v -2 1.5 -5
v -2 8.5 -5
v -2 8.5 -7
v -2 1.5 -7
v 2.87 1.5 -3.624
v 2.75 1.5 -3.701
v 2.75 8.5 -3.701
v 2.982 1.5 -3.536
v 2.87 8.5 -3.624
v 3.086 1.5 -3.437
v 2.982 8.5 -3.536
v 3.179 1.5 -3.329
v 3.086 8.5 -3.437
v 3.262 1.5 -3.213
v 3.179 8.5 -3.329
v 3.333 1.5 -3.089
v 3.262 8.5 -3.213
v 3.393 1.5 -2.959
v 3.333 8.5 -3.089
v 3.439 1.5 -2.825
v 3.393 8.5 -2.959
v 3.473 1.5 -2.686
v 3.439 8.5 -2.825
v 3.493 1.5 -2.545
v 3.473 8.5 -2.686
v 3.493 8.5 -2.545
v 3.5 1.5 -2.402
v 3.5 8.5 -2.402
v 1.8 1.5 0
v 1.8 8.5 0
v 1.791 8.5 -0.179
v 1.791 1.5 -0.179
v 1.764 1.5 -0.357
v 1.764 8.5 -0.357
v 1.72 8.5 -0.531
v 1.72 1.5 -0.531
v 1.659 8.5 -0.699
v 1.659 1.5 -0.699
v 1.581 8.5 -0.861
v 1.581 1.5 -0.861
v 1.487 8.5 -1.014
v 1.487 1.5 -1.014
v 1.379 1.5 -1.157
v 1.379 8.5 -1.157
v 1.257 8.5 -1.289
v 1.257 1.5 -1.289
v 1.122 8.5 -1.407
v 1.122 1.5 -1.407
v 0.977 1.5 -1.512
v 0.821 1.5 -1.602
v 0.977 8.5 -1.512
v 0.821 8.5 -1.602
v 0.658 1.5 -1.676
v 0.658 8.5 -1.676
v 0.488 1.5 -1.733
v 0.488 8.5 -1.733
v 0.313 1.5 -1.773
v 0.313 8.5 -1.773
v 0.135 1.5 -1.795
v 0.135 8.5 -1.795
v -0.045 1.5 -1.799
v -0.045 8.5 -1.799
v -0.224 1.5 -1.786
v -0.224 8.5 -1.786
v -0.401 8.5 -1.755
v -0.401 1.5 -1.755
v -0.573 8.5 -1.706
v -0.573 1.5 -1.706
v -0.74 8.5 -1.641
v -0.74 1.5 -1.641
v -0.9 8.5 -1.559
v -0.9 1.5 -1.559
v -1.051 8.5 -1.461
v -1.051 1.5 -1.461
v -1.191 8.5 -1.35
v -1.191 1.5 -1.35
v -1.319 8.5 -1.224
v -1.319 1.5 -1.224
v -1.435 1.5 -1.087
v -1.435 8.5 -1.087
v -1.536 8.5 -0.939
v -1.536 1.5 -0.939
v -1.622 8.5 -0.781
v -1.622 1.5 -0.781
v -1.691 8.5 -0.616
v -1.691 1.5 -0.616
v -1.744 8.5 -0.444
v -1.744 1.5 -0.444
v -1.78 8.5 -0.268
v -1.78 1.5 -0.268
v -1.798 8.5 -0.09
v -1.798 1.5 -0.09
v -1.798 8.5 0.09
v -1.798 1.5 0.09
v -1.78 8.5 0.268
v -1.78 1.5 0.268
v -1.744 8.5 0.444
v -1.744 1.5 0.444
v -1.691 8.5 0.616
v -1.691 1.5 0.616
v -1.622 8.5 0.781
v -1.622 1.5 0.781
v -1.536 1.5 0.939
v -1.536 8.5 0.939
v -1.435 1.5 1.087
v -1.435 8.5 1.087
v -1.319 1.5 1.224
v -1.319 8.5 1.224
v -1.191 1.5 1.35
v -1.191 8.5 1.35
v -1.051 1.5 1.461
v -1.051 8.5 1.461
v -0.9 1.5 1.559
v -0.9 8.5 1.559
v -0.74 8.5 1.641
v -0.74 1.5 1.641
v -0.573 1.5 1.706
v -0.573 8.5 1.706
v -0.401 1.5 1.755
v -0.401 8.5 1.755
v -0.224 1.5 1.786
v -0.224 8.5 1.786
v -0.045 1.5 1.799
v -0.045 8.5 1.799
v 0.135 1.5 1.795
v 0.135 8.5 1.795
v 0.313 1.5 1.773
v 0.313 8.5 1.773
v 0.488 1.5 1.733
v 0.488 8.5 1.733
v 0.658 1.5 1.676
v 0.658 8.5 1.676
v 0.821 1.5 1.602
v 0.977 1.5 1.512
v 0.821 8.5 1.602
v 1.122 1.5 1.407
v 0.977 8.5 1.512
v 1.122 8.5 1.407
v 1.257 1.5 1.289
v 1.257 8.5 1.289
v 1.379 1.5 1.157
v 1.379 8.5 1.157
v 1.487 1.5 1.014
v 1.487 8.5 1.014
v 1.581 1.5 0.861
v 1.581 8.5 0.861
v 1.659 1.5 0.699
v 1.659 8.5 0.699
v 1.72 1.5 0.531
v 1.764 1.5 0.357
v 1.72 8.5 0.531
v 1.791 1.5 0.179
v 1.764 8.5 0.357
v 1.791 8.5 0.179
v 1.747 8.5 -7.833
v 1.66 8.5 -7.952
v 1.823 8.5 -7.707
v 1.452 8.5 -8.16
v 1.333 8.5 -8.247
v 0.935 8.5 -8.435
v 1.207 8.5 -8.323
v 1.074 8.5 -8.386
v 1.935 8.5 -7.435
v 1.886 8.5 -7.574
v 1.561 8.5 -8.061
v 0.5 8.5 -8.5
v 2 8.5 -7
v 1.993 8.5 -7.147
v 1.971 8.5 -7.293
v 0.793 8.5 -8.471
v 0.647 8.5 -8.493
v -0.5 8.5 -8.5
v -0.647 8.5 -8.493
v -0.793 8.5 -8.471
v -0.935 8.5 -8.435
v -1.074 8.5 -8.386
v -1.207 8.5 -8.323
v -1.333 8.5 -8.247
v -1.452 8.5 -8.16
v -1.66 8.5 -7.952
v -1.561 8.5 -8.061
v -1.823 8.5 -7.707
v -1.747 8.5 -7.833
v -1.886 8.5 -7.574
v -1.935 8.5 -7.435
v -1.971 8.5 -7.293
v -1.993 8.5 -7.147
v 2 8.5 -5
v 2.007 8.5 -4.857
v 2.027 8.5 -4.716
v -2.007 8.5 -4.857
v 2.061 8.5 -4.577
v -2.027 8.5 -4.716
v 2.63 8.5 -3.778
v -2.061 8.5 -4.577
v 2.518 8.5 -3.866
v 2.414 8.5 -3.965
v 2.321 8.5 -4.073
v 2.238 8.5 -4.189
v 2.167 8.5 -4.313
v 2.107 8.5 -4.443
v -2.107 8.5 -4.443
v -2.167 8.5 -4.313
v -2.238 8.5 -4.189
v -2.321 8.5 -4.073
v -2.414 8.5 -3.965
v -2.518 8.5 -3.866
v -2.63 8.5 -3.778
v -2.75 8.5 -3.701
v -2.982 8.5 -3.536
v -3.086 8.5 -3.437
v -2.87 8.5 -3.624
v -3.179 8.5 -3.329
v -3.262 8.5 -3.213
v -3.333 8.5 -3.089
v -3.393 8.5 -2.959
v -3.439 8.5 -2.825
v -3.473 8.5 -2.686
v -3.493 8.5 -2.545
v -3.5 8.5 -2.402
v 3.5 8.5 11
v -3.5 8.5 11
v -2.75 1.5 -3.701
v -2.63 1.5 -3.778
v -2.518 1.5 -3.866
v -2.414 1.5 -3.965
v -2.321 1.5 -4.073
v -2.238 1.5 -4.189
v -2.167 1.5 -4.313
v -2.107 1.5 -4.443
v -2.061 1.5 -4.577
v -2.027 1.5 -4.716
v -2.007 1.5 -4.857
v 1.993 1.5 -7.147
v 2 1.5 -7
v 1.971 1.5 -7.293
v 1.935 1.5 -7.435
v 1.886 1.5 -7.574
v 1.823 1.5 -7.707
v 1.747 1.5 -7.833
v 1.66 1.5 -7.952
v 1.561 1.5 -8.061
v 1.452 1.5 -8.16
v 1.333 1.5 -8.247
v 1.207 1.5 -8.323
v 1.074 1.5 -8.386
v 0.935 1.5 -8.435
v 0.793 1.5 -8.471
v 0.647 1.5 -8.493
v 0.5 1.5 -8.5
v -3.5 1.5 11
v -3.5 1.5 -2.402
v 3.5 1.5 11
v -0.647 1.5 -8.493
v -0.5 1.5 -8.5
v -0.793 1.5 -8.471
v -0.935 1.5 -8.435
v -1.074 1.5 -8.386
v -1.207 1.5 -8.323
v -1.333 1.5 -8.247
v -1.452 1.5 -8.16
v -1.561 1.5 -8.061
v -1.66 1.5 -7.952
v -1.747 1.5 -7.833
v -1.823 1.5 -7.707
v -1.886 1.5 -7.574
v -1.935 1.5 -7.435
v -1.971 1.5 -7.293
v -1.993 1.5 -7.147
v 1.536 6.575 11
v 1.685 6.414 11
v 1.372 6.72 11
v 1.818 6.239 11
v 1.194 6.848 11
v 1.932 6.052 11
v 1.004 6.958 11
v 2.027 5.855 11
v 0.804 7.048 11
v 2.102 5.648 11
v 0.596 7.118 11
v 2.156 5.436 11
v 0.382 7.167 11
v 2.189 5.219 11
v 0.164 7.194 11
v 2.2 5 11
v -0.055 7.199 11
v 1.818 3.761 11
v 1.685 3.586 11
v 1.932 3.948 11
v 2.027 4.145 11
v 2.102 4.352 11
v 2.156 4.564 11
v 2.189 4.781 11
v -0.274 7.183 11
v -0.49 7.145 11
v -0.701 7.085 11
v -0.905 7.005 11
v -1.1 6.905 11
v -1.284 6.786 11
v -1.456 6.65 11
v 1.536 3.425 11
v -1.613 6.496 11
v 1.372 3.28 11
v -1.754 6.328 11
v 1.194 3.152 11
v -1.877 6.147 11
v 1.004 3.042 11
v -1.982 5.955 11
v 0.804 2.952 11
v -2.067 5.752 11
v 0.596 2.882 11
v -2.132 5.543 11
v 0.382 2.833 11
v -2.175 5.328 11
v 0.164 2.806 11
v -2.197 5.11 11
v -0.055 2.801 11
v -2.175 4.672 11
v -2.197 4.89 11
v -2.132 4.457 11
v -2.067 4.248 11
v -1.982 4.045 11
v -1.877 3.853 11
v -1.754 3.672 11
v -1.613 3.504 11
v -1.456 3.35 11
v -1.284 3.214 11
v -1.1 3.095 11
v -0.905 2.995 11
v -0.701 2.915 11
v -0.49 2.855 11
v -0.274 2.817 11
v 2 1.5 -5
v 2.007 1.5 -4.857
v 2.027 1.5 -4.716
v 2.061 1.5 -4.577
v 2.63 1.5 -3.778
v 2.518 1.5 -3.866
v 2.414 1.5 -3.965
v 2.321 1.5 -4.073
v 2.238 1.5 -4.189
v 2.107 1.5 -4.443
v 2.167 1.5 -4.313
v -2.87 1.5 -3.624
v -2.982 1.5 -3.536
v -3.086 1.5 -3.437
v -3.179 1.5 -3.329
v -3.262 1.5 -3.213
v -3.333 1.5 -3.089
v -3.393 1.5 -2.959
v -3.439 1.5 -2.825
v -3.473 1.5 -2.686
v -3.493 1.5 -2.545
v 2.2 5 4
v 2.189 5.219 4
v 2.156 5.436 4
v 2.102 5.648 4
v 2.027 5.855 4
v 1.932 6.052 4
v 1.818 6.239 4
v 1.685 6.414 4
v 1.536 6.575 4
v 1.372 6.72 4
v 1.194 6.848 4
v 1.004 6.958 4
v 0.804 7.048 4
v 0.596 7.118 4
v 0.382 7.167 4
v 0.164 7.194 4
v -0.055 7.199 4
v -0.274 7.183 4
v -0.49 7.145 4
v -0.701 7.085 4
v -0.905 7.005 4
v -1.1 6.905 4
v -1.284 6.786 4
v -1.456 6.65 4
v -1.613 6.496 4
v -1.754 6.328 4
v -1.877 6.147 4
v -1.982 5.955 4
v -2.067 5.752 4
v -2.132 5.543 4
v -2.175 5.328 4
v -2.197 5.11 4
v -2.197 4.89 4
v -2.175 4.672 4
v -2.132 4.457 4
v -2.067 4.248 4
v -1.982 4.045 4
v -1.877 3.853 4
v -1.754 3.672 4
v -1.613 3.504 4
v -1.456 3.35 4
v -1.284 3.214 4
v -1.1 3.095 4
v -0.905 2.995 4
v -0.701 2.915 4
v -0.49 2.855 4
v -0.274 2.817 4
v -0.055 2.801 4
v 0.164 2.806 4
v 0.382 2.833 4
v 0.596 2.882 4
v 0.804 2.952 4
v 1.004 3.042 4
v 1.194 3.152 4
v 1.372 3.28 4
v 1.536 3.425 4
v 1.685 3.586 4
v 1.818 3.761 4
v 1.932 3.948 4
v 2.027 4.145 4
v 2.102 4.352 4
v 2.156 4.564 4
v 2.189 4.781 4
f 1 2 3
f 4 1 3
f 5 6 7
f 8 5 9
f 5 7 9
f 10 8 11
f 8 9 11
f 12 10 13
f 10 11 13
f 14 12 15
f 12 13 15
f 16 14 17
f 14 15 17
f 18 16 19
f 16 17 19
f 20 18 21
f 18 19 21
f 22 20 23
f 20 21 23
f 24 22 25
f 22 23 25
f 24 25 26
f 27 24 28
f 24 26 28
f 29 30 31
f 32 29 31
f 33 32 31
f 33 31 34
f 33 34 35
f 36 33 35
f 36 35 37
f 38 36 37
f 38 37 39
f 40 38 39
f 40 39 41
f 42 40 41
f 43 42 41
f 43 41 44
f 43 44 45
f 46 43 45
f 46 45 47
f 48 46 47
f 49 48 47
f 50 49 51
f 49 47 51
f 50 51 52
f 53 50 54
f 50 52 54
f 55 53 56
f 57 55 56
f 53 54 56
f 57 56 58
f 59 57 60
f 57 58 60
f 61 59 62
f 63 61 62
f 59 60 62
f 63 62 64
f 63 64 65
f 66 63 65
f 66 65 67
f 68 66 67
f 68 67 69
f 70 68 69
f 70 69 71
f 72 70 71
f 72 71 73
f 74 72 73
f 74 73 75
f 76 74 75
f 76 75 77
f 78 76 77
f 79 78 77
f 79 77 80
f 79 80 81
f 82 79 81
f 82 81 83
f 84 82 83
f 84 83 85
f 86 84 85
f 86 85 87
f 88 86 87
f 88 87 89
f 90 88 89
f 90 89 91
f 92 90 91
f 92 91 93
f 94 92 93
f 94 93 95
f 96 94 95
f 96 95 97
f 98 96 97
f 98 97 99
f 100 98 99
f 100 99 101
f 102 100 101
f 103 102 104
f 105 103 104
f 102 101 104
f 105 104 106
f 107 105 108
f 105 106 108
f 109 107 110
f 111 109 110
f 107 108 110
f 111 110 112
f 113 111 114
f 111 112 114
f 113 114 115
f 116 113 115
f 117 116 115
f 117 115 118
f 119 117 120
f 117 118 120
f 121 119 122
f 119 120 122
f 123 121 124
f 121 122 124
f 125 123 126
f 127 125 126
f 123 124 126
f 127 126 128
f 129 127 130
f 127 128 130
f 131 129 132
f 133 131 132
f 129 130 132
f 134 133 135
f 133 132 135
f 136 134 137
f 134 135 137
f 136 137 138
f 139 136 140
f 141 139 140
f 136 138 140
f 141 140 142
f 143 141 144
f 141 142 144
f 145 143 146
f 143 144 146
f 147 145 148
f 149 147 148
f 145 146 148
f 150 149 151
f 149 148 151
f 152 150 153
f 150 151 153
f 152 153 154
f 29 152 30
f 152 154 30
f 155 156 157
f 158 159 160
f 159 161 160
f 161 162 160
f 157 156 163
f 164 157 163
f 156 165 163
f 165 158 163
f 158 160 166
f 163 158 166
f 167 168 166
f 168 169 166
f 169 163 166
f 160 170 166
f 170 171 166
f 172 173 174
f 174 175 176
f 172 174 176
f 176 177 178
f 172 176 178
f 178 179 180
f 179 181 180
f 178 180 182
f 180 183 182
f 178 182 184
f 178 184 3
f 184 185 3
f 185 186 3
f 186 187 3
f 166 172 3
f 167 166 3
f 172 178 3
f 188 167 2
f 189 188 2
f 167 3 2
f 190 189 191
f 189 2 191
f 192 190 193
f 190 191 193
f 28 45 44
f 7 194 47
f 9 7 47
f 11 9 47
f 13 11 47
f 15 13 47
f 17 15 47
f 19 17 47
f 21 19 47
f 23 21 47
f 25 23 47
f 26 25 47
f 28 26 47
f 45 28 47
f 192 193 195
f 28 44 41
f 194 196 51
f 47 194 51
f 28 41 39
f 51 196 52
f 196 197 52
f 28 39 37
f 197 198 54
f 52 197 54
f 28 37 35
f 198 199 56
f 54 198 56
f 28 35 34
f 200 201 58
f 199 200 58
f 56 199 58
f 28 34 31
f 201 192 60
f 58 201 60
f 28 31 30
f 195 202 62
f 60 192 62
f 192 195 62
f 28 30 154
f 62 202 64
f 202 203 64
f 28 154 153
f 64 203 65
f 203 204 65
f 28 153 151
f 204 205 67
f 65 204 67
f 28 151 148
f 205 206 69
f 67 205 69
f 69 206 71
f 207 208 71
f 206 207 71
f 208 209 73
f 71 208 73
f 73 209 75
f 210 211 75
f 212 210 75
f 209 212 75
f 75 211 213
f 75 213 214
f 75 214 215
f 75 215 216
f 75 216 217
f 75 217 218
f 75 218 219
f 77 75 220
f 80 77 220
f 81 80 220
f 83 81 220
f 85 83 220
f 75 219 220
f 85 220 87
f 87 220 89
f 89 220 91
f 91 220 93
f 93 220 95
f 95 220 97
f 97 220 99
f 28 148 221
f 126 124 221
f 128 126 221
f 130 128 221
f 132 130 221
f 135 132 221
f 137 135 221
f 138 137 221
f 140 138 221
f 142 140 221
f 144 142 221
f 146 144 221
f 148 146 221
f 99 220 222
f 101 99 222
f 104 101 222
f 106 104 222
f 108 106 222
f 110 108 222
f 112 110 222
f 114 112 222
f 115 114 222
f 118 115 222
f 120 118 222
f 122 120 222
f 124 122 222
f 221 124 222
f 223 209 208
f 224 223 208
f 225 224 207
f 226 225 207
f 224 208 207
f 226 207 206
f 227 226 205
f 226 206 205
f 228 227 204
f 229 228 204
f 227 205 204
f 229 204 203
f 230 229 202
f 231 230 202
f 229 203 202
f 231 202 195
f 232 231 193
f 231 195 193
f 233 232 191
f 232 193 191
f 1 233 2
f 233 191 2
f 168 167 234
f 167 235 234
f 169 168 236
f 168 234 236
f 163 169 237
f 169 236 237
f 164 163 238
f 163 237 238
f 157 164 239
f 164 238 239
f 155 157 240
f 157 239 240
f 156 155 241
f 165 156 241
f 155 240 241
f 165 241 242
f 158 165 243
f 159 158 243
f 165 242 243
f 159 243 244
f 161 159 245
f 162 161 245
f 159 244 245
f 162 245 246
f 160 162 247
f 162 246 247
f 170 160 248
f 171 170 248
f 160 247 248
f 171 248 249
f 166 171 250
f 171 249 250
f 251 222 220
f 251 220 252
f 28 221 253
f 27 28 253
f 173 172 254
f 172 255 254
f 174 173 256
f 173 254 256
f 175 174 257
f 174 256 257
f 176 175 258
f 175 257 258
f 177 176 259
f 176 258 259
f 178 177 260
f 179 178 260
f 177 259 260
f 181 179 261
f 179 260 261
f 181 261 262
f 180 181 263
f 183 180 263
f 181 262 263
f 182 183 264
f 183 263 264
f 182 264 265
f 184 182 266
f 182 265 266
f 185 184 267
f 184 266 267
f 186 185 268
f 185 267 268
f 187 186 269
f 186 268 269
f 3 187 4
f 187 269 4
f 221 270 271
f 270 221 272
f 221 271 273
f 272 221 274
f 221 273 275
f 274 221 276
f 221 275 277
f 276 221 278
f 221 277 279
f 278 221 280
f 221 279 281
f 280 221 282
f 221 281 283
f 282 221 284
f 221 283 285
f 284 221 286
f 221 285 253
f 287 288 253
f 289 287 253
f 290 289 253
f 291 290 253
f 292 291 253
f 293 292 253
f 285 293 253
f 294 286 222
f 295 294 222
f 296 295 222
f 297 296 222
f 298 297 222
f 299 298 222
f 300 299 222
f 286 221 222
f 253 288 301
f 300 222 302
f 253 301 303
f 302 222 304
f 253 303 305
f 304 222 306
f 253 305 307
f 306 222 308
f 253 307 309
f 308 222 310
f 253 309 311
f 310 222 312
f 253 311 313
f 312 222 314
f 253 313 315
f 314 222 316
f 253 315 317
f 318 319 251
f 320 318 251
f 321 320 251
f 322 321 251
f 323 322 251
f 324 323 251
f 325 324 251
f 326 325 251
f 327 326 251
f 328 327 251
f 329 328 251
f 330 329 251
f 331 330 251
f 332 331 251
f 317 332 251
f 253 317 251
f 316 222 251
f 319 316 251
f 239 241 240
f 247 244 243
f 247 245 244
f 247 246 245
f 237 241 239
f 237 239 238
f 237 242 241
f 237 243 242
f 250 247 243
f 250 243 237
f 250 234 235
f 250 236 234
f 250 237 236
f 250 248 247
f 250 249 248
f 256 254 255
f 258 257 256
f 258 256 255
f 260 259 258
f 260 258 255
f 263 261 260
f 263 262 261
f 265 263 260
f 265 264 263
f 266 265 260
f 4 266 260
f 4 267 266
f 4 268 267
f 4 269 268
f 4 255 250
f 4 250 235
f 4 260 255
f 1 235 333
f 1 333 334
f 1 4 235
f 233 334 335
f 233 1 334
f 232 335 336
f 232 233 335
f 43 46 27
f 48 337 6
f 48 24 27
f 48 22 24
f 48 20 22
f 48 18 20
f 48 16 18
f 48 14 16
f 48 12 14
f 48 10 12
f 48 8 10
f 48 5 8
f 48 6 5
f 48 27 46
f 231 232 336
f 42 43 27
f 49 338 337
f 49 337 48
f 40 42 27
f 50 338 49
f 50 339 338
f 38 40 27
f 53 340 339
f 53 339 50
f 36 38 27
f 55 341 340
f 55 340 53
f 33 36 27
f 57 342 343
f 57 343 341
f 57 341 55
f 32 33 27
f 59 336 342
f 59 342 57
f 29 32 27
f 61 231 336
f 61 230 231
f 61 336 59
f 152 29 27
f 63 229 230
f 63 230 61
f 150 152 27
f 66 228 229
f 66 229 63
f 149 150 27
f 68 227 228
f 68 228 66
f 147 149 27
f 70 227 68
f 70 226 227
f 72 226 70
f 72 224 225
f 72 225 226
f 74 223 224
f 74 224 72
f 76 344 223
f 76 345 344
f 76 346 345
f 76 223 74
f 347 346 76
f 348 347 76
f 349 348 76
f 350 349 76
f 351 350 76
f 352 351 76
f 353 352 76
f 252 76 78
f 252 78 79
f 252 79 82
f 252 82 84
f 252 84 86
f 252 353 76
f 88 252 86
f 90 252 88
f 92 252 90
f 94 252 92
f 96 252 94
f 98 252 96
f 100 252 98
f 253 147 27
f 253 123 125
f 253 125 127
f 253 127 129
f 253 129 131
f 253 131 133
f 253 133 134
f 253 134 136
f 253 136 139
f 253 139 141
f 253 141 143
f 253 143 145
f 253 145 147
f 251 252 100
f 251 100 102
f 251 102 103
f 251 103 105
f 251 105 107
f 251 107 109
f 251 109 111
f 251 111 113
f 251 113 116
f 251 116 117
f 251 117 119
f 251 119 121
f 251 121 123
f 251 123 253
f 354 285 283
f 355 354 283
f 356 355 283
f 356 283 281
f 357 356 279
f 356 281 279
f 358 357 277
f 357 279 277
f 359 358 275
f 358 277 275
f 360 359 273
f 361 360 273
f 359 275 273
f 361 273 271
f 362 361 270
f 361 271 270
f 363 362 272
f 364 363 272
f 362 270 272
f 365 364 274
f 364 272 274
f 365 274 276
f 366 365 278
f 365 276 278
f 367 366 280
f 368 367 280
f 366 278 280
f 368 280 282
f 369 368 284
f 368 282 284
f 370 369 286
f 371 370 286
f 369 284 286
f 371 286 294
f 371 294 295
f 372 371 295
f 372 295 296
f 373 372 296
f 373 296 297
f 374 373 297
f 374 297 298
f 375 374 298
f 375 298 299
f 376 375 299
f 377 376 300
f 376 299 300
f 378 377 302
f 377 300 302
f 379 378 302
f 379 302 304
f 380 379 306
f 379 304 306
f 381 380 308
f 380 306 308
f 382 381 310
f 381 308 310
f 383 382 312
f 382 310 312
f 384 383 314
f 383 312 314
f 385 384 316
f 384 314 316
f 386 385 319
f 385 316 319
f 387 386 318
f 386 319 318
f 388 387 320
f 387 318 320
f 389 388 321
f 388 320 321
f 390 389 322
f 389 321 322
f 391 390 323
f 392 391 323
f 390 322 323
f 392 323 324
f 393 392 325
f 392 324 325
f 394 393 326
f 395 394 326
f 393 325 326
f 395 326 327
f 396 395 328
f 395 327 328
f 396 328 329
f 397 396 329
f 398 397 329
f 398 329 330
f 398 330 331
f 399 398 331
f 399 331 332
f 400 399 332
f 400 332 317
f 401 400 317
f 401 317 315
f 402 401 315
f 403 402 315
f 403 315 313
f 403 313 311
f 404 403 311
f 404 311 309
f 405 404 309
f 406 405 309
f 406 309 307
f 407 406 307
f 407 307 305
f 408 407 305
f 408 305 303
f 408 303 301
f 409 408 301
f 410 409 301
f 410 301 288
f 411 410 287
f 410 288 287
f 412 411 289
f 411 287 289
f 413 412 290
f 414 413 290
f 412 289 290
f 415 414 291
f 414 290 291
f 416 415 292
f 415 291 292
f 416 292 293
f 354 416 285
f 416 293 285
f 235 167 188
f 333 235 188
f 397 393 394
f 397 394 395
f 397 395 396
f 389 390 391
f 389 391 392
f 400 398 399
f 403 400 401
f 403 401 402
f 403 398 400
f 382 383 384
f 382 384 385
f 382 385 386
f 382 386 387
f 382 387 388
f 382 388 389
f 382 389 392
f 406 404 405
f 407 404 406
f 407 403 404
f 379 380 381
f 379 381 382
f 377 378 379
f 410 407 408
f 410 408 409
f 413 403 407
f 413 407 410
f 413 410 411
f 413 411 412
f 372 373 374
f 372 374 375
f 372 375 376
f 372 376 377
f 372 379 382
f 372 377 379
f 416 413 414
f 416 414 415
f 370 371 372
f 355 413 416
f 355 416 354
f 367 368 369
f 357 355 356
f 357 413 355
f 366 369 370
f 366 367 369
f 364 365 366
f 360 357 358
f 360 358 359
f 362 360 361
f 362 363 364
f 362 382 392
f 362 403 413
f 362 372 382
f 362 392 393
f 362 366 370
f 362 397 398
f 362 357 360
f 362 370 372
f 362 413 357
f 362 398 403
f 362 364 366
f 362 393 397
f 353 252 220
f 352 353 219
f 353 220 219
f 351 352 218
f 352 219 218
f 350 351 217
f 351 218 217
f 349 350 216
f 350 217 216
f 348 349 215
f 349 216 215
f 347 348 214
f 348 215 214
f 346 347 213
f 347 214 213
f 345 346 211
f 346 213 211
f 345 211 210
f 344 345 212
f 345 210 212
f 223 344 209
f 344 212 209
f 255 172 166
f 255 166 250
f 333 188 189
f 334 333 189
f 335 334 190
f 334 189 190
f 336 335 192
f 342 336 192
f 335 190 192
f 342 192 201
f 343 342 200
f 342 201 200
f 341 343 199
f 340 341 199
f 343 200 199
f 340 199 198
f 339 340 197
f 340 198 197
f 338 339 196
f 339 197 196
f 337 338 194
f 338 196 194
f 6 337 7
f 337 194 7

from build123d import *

# Parameters (mm, degrees)
SKETCH1_W           = 7
SKETCH1_H           = 19.5
BOSS_EXTRUDE1_DEPTH = 7
CUT_EXTRUDE1_DEPTH  = 8
CUT_EXTRUDE2_DEPTH  = 8
FILLET1_R           = 1.5
CUT_EXTRUDE3_REACH  = 9
SKETCH4_R           = 1.8
SKETCH5_R           = 2.2
CUT_EXTRUDE4_DEPTH  = 7


with BuildPart() as part:
    # Sketch1 → Boss-Extrude1 (new body)
    with BuildSketch(Plane(origin=(-3.5, 0, 0), x_dir=(0, -1, 0), z_dir=(-1, 0, 0))):
        with Locations((-5, 1.25)):
            Rectangle(SKETCH1_W, SKETCH1_H)
    extrude(amount=-BOSS_EXTRUDE1_DEPTH)

    # Sketch2 → Cut-Extrude1 (cut, through all)
    with BuildSketch(Plane(origin=(0, 8.5, 0), x_dir=(-1, 0, 0), z_dir=(0, 1, 0))):
        with BuildLine():
            Line((-3.5, -2.401923806), (-3.5, -8.5))
            Line((-3.5, -8.5), (-2.00000003, -8.5))
            Line((-2.00000003, -8.5), (-2.00000003, -5))
            ThreePointArc((-2.00000003, -5), (-2.20096192, -4.250000007), (-2.750000015, -3.700961903))
            ThreePointArc((-2.750000015, -3.700961903), (-3.29903811, -3.151923798), (-3.5, -2.401923806))
        make_face()
    extrude(amount=-CUT_EXTRUDE1_DEPTH, mode=Mode.SUBTRACT)

    # Sketch3 → Cut-Extrude2 (cut, through all)
    with BuildSketch(Plane(origin=(0, 8.5, 0), x_dir=(-1, 0, 0), z_dir=(0, 1, 0))):
        with BuildLine():
            Line((1.99999997, -5), (1.99999997, -8.5))
            Line((1.99999997, -8.5), (3.5, -8.5))
            Line((3.5, -8.5), (3.5, -2.401923771))
            ThreePointArc((3.5, -2.401923771), (3.299038101, -3.151923779), (2.749999985, -3.700961886))
            ThreePointArc((2.749999985, -3.700961886), (2.200961869, -4.249999993), (1.99999997, -5))
        make_face()
    extrude(amount=-CUT_EXTRUDE2_DEPTH, mode=Mode.SUBTRACT)

    # Fillet1
    fillet1_edges = [part.edges().sort_by_distance(p)[0] for p in [
        (2.00000003, 5, -8.5),
        (-1.99999997, 5, -8.5),
    ]]
    fillet(fillet1_edges, radius=FILLET1_R)

    # Sketch4 → Cut-Extrude3 (cut, up to next)
    with BuildSketch(Plane(origin=(0, 8.5, 0), x_dir=(1, 0, 0), z_dir=(0, 1, 0)), mode=Mode.PRIVATE) as cut_extrude3_sk1:
        Circle(SKETCH4_R)
    cut_extrude3_tool1 = extrude(cut_extrude3_sk1.sketch, amount=-CUT_EXTRUDE3_REACH, mode=Mode.PRIVATE) & part.part
    add(cut_extrude3_tool1.solids().sort_by_distance((0, 8.5, 0))[0], mode=Mode.SUBTRACT)

    # Sketch5 → Cut-Extrude4 (cut)
    with BuildSketch(Plane.XY.offset(11)):
        with Locations((0, 5)):
            Circle(SKETCH5_R)
    extrude(amount=-CUT_EXTRUDE4_DEPTH, mode=Mode.SUBTRACT)


solid = part.part
